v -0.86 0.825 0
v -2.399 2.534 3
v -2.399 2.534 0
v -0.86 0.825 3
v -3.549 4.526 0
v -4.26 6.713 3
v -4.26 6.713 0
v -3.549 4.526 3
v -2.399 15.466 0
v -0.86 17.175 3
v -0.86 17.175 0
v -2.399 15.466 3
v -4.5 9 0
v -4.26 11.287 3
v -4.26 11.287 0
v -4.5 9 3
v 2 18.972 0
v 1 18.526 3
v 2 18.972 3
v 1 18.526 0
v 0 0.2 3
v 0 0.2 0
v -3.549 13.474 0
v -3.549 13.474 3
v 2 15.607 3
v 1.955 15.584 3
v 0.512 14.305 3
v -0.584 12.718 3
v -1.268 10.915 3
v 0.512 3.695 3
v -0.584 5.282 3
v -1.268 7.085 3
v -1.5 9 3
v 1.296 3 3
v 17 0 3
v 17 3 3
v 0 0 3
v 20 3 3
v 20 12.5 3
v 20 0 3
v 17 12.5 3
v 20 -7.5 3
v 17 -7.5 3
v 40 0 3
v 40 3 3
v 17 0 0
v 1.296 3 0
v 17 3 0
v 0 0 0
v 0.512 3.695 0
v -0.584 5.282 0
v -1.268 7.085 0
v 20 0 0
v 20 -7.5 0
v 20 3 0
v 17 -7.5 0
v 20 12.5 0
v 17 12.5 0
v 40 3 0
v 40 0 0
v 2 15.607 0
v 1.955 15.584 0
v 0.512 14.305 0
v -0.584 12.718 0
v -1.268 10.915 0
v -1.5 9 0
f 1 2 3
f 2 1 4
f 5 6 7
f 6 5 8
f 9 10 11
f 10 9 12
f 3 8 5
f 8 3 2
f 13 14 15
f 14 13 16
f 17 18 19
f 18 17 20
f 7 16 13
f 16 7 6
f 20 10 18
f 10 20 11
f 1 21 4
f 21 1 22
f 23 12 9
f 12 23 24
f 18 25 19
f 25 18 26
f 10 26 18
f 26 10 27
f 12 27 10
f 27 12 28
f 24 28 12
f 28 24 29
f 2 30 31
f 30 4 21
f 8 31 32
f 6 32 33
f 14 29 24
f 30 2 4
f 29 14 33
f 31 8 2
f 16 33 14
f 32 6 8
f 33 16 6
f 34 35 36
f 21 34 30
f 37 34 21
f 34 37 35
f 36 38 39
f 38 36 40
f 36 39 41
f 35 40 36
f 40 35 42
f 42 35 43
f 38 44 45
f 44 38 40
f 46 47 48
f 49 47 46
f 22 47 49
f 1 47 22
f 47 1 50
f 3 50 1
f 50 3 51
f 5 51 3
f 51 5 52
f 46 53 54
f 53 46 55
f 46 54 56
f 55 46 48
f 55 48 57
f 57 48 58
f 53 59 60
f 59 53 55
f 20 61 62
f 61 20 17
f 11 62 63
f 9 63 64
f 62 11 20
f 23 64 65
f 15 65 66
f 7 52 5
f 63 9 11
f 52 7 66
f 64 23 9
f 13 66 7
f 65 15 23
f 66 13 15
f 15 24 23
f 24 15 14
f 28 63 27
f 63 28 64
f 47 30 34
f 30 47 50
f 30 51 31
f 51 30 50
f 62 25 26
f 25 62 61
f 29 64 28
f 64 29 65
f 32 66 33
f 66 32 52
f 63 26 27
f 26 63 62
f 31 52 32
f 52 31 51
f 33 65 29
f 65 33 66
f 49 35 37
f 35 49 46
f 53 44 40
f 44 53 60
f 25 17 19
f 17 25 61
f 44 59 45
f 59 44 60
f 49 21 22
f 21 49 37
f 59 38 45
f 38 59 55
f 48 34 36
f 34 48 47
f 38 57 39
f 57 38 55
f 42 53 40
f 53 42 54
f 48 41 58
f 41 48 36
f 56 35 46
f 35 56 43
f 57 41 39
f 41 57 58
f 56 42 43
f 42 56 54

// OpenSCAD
cube([40,3,3]);
difference(){
translate([6.5,9,0])
cylinder(3,11,11);
translate([6.5,9,0])
cylinder(3,8,8);
translate([0,-5,0])
cube([20,5,3]);
translate([2,0,0])
cube([20,25,3]);
}
translate([17,-7.5,0])
cube([3,20,3]);
